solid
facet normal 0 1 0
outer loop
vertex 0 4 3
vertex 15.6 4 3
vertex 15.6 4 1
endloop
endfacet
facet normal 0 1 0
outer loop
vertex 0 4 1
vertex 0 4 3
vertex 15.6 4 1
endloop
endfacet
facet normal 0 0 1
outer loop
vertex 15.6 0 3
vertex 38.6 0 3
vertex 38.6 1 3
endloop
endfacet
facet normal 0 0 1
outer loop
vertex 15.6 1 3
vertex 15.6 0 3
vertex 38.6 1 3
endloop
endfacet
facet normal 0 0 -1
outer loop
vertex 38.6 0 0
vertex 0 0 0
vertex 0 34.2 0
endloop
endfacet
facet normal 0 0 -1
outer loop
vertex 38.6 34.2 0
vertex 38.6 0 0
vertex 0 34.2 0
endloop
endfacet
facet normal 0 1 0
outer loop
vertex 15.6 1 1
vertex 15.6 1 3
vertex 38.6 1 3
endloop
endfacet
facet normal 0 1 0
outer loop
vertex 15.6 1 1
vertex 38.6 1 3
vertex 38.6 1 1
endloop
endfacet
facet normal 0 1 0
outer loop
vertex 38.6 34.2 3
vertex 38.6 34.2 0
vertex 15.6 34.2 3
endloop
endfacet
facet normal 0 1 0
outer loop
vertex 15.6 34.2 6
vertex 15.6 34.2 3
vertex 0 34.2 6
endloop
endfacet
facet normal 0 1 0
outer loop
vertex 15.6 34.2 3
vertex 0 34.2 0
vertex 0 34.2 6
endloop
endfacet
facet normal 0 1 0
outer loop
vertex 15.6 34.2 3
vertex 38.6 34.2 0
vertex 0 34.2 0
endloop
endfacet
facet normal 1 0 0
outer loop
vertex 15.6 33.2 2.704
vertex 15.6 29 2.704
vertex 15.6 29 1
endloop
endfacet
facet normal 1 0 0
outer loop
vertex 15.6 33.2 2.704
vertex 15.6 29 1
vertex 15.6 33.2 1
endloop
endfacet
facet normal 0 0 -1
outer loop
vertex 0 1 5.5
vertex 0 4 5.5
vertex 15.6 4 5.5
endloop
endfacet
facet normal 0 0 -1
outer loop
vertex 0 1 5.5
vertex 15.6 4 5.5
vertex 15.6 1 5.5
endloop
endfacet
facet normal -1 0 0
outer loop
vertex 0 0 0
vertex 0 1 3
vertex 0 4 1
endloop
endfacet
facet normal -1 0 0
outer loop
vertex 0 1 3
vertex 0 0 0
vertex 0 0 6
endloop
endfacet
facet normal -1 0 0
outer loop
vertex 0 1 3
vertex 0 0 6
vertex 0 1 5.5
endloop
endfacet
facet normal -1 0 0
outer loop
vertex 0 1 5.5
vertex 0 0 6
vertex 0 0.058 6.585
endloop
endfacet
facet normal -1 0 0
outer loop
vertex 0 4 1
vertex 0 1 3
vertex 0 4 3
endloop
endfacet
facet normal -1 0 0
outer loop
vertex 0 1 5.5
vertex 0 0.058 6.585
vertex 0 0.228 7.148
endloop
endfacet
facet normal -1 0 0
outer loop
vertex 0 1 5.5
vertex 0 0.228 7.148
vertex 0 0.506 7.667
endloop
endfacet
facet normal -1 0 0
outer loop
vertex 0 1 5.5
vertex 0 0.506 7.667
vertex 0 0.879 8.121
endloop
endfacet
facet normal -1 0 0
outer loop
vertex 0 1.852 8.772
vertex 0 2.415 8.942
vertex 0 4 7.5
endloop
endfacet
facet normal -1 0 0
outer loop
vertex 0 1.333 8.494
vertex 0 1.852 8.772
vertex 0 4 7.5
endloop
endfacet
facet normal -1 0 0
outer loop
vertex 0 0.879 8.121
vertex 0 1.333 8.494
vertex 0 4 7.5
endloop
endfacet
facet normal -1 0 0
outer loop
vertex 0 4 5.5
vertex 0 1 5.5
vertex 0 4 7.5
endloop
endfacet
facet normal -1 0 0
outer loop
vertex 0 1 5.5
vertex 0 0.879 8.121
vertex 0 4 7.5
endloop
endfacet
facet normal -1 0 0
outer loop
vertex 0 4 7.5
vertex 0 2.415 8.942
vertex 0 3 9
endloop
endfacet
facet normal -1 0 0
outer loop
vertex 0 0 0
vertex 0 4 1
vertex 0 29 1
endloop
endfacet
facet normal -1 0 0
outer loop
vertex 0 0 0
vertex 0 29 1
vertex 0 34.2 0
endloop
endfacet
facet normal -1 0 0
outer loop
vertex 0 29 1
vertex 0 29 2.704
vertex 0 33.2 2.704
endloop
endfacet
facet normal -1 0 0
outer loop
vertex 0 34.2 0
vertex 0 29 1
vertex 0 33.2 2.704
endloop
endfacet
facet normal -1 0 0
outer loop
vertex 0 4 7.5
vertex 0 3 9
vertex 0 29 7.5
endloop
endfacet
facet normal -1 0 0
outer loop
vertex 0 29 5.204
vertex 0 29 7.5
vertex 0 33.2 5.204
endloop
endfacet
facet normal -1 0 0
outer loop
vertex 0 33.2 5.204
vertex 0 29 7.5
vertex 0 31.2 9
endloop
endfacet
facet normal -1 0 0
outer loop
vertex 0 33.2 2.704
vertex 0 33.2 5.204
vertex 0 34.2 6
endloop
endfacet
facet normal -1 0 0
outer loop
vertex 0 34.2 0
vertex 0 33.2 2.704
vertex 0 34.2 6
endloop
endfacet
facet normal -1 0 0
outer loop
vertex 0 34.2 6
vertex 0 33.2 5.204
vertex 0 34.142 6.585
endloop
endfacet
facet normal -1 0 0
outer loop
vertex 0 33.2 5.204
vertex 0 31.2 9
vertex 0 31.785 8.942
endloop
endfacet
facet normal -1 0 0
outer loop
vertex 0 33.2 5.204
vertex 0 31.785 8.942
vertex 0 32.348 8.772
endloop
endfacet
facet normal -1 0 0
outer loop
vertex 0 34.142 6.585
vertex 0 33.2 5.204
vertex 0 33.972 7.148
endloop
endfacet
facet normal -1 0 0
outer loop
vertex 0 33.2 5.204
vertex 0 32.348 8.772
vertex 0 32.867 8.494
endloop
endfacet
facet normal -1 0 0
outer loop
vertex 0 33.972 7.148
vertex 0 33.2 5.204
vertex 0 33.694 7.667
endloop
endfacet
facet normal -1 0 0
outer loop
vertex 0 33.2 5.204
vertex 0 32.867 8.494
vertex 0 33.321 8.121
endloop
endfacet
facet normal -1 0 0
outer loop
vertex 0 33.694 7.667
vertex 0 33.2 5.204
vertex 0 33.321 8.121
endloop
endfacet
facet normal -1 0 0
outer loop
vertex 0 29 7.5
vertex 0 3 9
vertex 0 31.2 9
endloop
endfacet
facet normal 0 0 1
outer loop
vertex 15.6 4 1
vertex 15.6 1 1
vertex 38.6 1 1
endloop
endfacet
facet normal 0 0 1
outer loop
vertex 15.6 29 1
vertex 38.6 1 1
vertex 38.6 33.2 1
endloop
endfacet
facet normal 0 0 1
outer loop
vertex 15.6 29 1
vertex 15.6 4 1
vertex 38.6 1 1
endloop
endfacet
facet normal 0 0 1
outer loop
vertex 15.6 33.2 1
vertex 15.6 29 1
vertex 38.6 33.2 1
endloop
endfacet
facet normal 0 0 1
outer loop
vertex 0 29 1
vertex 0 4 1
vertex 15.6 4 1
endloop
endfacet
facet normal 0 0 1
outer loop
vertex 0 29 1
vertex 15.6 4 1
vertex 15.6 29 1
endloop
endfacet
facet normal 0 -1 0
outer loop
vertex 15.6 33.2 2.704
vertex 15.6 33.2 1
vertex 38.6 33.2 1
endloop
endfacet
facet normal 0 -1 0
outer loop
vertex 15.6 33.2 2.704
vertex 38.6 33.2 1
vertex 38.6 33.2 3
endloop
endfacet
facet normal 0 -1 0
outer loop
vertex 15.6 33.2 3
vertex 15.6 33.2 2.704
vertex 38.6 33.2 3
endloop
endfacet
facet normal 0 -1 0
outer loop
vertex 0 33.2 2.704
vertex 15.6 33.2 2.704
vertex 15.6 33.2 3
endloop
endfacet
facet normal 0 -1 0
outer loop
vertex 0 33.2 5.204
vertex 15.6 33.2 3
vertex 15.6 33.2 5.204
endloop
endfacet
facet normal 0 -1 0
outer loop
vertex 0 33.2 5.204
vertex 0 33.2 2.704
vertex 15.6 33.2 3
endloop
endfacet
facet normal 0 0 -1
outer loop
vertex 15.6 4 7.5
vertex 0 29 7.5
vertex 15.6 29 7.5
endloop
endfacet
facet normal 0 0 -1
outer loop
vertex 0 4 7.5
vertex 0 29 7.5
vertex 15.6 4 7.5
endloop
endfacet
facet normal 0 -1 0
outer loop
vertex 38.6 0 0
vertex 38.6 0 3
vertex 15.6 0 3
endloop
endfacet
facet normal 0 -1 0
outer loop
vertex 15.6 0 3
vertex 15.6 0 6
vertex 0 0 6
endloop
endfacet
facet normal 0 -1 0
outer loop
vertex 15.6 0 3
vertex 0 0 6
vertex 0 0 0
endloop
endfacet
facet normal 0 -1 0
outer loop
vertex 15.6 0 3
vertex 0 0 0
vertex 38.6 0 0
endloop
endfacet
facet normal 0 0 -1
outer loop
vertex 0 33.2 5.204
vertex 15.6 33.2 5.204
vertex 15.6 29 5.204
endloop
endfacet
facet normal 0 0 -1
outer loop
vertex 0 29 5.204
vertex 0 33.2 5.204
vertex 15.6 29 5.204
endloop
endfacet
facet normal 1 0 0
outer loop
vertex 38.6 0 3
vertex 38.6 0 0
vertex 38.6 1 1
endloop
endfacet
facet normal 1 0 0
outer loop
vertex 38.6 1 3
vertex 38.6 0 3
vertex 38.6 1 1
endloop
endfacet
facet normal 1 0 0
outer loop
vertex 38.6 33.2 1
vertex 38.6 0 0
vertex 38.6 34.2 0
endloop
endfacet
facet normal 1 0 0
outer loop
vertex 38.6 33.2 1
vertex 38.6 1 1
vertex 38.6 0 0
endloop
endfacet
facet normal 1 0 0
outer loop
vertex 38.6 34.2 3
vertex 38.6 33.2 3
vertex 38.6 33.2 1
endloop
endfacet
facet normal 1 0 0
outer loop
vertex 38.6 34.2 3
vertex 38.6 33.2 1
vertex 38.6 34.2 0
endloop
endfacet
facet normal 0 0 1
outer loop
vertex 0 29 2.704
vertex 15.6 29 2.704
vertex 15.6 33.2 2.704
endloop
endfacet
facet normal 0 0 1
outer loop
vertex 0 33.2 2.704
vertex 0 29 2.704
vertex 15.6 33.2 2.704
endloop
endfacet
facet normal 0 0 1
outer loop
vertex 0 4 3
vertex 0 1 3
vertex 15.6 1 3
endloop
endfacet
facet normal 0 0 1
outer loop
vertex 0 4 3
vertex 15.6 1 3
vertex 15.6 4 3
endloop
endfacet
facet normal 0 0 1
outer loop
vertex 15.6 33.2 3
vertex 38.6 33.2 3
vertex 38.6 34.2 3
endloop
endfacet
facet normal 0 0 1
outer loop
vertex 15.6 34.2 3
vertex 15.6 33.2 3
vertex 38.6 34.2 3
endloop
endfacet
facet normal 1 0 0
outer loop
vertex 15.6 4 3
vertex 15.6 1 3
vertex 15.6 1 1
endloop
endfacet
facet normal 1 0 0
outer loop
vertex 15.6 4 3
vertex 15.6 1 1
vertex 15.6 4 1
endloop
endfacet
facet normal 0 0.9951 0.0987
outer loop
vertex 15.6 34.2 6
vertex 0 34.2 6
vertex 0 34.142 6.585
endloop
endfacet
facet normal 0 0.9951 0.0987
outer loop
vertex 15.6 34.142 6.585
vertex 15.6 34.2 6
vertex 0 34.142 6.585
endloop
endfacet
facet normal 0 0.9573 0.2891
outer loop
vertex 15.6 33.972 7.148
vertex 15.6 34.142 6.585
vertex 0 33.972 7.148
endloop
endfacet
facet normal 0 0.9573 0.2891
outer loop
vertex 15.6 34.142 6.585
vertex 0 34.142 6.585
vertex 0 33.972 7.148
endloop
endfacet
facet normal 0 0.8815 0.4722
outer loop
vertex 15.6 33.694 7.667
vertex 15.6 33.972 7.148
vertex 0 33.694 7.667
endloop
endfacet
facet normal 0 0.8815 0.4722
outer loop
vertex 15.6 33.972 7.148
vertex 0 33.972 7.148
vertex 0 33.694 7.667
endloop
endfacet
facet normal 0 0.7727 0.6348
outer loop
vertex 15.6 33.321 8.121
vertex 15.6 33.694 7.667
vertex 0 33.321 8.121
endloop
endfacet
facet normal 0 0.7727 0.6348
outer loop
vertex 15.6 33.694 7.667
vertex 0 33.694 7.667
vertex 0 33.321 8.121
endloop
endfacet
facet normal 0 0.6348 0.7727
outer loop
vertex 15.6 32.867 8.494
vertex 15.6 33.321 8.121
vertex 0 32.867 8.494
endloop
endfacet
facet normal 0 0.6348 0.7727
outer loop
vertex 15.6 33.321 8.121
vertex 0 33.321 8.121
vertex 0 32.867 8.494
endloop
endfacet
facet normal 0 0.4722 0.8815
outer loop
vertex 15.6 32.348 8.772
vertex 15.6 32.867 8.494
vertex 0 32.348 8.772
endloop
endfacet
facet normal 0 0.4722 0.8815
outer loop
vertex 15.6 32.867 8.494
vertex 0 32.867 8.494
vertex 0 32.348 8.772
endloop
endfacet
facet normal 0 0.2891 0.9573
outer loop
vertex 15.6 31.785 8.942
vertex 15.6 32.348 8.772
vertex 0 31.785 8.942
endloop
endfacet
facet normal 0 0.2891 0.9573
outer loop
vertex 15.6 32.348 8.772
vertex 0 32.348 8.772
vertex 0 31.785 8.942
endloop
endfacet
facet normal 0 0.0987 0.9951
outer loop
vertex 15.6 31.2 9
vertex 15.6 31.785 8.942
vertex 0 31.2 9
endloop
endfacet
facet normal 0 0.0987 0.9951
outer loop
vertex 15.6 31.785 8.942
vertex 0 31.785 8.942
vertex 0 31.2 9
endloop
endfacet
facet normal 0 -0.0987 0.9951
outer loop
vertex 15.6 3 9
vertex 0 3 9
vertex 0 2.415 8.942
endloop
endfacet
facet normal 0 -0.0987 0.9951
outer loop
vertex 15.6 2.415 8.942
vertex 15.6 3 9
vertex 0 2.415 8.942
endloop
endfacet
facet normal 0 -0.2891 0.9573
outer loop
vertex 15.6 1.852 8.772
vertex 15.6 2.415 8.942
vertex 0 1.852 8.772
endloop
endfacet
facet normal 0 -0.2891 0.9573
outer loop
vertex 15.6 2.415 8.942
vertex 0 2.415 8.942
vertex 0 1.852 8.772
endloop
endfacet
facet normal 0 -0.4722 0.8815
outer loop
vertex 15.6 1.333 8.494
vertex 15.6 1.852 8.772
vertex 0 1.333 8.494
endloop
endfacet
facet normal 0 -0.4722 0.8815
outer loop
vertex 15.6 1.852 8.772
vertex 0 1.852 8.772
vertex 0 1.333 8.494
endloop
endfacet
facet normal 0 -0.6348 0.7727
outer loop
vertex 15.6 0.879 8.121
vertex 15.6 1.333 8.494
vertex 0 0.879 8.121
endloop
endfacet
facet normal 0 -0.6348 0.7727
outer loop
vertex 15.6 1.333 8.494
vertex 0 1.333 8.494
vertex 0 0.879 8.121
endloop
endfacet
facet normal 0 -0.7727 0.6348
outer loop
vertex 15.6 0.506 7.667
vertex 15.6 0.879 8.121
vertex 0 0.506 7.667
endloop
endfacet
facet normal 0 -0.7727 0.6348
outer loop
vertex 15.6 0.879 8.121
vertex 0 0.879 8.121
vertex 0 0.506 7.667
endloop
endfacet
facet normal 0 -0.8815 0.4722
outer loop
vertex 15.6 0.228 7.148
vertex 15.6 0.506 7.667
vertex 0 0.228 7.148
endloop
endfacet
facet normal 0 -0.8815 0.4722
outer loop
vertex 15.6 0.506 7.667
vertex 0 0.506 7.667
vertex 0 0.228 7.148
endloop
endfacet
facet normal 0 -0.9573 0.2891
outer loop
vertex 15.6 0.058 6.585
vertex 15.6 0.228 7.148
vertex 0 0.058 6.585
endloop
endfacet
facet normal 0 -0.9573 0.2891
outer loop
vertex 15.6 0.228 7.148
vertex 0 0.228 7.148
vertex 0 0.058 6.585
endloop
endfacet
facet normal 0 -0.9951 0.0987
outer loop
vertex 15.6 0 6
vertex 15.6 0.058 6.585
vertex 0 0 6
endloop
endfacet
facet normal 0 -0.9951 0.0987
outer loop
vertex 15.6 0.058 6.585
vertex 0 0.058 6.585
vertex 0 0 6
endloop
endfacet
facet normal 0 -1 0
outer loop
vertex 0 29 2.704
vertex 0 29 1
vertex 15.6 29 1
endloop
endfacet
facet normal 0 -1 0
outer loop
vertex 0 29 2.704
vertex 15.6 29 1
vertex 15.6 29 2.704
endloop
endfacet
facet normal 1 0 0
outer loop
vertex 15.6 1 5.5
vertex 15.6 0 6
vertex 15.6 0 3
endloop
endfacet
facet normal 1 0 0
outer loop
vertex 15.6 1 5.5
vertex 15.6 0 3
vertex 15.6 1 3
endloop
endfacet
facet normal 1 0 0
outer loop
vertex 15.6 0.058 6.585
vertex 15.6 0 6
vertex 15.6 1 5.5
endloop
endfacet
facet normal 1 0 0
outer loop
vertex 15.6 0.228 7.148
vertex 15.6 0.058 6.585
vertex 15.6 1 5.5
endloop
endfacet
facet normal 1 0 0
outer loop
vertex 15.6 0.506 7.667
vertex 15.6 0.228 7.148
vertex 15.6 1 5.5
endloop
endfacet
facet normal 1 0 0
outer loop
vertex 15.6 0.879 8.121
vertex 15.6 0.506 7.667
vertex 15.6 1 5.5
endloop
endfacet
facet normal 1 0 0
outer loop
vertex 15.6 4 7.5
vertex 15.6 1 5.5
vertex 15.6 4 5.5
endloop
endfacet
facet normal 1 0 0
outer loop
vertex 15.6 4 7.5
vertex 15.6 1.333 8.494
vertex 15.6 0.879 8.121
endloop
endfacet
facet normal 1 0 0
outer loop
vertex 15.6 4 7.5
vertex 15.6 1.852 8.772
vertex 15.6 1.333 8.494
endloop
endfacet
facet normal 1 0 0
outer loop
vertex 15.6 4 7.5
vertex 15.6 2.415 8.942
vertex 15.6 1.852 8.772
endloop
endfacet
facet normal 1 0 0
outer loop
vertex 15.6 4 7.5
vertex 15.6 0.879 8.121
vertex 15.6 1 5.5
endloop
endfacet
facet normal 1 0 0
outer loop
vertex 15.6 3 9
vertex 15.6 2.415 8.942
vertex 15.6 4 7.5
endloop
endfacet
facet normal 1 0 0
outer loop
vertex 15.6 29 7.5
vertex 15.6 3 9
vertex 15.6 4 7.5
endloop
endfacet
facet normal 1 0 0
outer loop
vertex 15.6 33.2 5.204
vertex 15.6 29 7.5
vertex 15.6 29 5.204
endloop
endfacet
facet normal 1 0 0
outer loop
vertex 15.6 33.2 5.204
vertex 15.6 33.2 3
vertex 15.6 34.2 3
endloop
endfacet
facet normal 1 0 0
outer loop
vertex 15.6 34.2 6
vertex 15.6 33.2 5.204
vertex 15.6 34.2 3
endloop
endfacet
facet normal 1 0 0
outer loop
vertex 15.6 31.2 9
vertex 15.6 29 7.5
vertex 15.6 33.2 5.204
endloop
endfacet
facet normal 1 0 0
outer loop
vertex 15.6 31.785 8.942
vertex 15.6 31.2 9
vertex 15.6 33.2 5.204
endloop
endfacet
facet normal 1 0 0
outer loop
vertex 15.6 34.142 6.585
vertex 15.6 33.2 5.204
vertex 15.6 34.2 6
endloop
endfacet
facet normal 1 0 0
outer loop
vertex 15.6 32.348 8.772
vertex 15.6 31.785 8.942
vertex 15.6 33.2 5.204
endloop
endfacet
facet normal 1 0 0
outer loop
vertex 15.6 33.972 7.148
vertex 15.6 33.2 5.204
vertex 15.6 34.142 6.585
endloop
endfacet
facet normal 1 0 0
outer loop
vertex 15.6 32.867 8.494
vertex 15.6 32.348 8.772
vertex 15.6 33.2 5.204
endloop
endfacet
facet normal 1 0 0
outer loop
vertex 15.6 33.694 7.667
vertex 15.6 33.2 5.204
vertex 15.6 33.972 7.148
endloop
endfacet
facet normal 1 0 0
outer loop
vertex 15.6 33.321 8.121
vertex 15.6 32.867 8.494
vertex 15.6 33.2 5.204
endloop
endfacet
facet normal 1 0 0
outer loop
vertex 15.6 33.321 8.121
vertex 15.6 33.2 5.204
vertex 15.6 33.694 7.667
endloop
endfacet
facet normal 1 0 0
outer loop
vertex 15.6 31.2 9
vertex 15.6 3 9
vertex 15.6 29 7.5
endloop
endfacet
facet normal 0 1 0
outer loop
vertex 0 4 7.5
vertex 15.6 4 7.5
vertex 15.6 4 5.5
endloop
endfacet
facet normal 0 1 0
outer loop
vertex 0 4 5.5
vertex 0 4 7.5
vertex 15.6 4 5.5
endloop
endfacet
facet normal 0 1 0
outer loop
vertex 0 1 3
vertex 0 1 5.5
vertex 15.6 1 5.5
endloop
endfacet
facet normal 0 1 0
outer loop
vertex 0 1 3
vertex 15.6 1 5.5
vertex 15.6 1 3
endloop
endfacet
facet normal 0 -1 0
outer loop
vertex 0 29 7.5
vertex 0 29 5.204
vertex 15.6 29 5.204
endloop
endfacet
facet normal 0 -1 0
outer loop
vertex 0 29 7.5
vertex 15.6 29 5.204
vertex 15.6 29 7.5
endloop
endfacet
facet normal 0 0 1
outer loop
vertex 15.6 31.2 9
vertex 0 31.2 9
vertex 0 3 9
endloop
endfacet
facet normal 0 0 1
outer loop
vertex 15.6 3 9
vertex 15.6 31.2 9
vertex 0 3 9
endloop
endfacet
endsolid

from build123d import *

# Parameters (mm, degrees)
PAD_DEPTH       = 38.6
POCKET_DEPTH    = 16
POCKET001_DEPTH = 23
SKETCH003_W     = 39.120222
SKETCH003_H     = 14.384815
POCKET002_DEPTH = 23


with BuildPart() as part:
    # Sketch → Pad (new body)
    with BuildSketch(Plane.YZ):
        with BuildLine():
            Line((0, 0), (34.2, 0))
            Line((34.2, 0), (34.2, 6))
            ThreePointArc((34.2, 6), (33.32132, 8.12132), (31.2, 9))
            Line((31.2, 9), (3, 9))
            ThreePointArc((3, 9), (0.87868, 8.12132), (0, 6))
            Line((0, 6), (0, 0))
        make_face()
    extrude(amount=PAD_DEPTH)

    # Sketch001 (on Face7 of Pad) → Pocket (cut)
    with BuildSketch(Plane(origin=(0, 0, 0), x_dir=(0, 1, 0), z_dir=(-1, 0, 0))):
        Polygon((4, -3), (4, -1), (29, -1), (29, -2.704358), (33.2, -2.704358), (33.2, -5.204358), (29, -5.204358), (29, -7.5), (4, -7.5), (4, -5.5), (1, -5.5), (1, -3), align=None)
    extrude(amount=-POCKET_DEPTH, mode=Mode.SUBTRACT)

    # Sketch002 (on Face5 of Pocket) → Pocket001 (cut)
    with BuildSketch(Plane.YZ.offset(38.6)):
        with BuildLine():
            Line((1, 1), (33.2, 1))
            Line((33.2, 1), (33.2, 6))
            ThreePointArc((33.2, 6), (32.32132, 8.12132), (30.2, 9))
            Line((30.2, 9), (4, 9))
            ThreePointArc((4, 9), (1.87868, 8.12132), (1, 6))
            Line((1, 6), (1, 1))
        make_face()
    extrude(amount=-POCKET001_DEPTH, mode=Mode.SUBTRACT)

    # Sketch003 (on Face5 of Pocket001) → Pocket002 (cut)
    with BuildSketch(Plane.YZ.offset(38.6)):
        with Locations((18.894067, 10.192407)):
            Rectangle(SKETCH003_W, SKETCH003_H)
    extrude(amount=-POCKET002_DEPTH, mode=Mode.SUBTRACT)


solid = part.part
